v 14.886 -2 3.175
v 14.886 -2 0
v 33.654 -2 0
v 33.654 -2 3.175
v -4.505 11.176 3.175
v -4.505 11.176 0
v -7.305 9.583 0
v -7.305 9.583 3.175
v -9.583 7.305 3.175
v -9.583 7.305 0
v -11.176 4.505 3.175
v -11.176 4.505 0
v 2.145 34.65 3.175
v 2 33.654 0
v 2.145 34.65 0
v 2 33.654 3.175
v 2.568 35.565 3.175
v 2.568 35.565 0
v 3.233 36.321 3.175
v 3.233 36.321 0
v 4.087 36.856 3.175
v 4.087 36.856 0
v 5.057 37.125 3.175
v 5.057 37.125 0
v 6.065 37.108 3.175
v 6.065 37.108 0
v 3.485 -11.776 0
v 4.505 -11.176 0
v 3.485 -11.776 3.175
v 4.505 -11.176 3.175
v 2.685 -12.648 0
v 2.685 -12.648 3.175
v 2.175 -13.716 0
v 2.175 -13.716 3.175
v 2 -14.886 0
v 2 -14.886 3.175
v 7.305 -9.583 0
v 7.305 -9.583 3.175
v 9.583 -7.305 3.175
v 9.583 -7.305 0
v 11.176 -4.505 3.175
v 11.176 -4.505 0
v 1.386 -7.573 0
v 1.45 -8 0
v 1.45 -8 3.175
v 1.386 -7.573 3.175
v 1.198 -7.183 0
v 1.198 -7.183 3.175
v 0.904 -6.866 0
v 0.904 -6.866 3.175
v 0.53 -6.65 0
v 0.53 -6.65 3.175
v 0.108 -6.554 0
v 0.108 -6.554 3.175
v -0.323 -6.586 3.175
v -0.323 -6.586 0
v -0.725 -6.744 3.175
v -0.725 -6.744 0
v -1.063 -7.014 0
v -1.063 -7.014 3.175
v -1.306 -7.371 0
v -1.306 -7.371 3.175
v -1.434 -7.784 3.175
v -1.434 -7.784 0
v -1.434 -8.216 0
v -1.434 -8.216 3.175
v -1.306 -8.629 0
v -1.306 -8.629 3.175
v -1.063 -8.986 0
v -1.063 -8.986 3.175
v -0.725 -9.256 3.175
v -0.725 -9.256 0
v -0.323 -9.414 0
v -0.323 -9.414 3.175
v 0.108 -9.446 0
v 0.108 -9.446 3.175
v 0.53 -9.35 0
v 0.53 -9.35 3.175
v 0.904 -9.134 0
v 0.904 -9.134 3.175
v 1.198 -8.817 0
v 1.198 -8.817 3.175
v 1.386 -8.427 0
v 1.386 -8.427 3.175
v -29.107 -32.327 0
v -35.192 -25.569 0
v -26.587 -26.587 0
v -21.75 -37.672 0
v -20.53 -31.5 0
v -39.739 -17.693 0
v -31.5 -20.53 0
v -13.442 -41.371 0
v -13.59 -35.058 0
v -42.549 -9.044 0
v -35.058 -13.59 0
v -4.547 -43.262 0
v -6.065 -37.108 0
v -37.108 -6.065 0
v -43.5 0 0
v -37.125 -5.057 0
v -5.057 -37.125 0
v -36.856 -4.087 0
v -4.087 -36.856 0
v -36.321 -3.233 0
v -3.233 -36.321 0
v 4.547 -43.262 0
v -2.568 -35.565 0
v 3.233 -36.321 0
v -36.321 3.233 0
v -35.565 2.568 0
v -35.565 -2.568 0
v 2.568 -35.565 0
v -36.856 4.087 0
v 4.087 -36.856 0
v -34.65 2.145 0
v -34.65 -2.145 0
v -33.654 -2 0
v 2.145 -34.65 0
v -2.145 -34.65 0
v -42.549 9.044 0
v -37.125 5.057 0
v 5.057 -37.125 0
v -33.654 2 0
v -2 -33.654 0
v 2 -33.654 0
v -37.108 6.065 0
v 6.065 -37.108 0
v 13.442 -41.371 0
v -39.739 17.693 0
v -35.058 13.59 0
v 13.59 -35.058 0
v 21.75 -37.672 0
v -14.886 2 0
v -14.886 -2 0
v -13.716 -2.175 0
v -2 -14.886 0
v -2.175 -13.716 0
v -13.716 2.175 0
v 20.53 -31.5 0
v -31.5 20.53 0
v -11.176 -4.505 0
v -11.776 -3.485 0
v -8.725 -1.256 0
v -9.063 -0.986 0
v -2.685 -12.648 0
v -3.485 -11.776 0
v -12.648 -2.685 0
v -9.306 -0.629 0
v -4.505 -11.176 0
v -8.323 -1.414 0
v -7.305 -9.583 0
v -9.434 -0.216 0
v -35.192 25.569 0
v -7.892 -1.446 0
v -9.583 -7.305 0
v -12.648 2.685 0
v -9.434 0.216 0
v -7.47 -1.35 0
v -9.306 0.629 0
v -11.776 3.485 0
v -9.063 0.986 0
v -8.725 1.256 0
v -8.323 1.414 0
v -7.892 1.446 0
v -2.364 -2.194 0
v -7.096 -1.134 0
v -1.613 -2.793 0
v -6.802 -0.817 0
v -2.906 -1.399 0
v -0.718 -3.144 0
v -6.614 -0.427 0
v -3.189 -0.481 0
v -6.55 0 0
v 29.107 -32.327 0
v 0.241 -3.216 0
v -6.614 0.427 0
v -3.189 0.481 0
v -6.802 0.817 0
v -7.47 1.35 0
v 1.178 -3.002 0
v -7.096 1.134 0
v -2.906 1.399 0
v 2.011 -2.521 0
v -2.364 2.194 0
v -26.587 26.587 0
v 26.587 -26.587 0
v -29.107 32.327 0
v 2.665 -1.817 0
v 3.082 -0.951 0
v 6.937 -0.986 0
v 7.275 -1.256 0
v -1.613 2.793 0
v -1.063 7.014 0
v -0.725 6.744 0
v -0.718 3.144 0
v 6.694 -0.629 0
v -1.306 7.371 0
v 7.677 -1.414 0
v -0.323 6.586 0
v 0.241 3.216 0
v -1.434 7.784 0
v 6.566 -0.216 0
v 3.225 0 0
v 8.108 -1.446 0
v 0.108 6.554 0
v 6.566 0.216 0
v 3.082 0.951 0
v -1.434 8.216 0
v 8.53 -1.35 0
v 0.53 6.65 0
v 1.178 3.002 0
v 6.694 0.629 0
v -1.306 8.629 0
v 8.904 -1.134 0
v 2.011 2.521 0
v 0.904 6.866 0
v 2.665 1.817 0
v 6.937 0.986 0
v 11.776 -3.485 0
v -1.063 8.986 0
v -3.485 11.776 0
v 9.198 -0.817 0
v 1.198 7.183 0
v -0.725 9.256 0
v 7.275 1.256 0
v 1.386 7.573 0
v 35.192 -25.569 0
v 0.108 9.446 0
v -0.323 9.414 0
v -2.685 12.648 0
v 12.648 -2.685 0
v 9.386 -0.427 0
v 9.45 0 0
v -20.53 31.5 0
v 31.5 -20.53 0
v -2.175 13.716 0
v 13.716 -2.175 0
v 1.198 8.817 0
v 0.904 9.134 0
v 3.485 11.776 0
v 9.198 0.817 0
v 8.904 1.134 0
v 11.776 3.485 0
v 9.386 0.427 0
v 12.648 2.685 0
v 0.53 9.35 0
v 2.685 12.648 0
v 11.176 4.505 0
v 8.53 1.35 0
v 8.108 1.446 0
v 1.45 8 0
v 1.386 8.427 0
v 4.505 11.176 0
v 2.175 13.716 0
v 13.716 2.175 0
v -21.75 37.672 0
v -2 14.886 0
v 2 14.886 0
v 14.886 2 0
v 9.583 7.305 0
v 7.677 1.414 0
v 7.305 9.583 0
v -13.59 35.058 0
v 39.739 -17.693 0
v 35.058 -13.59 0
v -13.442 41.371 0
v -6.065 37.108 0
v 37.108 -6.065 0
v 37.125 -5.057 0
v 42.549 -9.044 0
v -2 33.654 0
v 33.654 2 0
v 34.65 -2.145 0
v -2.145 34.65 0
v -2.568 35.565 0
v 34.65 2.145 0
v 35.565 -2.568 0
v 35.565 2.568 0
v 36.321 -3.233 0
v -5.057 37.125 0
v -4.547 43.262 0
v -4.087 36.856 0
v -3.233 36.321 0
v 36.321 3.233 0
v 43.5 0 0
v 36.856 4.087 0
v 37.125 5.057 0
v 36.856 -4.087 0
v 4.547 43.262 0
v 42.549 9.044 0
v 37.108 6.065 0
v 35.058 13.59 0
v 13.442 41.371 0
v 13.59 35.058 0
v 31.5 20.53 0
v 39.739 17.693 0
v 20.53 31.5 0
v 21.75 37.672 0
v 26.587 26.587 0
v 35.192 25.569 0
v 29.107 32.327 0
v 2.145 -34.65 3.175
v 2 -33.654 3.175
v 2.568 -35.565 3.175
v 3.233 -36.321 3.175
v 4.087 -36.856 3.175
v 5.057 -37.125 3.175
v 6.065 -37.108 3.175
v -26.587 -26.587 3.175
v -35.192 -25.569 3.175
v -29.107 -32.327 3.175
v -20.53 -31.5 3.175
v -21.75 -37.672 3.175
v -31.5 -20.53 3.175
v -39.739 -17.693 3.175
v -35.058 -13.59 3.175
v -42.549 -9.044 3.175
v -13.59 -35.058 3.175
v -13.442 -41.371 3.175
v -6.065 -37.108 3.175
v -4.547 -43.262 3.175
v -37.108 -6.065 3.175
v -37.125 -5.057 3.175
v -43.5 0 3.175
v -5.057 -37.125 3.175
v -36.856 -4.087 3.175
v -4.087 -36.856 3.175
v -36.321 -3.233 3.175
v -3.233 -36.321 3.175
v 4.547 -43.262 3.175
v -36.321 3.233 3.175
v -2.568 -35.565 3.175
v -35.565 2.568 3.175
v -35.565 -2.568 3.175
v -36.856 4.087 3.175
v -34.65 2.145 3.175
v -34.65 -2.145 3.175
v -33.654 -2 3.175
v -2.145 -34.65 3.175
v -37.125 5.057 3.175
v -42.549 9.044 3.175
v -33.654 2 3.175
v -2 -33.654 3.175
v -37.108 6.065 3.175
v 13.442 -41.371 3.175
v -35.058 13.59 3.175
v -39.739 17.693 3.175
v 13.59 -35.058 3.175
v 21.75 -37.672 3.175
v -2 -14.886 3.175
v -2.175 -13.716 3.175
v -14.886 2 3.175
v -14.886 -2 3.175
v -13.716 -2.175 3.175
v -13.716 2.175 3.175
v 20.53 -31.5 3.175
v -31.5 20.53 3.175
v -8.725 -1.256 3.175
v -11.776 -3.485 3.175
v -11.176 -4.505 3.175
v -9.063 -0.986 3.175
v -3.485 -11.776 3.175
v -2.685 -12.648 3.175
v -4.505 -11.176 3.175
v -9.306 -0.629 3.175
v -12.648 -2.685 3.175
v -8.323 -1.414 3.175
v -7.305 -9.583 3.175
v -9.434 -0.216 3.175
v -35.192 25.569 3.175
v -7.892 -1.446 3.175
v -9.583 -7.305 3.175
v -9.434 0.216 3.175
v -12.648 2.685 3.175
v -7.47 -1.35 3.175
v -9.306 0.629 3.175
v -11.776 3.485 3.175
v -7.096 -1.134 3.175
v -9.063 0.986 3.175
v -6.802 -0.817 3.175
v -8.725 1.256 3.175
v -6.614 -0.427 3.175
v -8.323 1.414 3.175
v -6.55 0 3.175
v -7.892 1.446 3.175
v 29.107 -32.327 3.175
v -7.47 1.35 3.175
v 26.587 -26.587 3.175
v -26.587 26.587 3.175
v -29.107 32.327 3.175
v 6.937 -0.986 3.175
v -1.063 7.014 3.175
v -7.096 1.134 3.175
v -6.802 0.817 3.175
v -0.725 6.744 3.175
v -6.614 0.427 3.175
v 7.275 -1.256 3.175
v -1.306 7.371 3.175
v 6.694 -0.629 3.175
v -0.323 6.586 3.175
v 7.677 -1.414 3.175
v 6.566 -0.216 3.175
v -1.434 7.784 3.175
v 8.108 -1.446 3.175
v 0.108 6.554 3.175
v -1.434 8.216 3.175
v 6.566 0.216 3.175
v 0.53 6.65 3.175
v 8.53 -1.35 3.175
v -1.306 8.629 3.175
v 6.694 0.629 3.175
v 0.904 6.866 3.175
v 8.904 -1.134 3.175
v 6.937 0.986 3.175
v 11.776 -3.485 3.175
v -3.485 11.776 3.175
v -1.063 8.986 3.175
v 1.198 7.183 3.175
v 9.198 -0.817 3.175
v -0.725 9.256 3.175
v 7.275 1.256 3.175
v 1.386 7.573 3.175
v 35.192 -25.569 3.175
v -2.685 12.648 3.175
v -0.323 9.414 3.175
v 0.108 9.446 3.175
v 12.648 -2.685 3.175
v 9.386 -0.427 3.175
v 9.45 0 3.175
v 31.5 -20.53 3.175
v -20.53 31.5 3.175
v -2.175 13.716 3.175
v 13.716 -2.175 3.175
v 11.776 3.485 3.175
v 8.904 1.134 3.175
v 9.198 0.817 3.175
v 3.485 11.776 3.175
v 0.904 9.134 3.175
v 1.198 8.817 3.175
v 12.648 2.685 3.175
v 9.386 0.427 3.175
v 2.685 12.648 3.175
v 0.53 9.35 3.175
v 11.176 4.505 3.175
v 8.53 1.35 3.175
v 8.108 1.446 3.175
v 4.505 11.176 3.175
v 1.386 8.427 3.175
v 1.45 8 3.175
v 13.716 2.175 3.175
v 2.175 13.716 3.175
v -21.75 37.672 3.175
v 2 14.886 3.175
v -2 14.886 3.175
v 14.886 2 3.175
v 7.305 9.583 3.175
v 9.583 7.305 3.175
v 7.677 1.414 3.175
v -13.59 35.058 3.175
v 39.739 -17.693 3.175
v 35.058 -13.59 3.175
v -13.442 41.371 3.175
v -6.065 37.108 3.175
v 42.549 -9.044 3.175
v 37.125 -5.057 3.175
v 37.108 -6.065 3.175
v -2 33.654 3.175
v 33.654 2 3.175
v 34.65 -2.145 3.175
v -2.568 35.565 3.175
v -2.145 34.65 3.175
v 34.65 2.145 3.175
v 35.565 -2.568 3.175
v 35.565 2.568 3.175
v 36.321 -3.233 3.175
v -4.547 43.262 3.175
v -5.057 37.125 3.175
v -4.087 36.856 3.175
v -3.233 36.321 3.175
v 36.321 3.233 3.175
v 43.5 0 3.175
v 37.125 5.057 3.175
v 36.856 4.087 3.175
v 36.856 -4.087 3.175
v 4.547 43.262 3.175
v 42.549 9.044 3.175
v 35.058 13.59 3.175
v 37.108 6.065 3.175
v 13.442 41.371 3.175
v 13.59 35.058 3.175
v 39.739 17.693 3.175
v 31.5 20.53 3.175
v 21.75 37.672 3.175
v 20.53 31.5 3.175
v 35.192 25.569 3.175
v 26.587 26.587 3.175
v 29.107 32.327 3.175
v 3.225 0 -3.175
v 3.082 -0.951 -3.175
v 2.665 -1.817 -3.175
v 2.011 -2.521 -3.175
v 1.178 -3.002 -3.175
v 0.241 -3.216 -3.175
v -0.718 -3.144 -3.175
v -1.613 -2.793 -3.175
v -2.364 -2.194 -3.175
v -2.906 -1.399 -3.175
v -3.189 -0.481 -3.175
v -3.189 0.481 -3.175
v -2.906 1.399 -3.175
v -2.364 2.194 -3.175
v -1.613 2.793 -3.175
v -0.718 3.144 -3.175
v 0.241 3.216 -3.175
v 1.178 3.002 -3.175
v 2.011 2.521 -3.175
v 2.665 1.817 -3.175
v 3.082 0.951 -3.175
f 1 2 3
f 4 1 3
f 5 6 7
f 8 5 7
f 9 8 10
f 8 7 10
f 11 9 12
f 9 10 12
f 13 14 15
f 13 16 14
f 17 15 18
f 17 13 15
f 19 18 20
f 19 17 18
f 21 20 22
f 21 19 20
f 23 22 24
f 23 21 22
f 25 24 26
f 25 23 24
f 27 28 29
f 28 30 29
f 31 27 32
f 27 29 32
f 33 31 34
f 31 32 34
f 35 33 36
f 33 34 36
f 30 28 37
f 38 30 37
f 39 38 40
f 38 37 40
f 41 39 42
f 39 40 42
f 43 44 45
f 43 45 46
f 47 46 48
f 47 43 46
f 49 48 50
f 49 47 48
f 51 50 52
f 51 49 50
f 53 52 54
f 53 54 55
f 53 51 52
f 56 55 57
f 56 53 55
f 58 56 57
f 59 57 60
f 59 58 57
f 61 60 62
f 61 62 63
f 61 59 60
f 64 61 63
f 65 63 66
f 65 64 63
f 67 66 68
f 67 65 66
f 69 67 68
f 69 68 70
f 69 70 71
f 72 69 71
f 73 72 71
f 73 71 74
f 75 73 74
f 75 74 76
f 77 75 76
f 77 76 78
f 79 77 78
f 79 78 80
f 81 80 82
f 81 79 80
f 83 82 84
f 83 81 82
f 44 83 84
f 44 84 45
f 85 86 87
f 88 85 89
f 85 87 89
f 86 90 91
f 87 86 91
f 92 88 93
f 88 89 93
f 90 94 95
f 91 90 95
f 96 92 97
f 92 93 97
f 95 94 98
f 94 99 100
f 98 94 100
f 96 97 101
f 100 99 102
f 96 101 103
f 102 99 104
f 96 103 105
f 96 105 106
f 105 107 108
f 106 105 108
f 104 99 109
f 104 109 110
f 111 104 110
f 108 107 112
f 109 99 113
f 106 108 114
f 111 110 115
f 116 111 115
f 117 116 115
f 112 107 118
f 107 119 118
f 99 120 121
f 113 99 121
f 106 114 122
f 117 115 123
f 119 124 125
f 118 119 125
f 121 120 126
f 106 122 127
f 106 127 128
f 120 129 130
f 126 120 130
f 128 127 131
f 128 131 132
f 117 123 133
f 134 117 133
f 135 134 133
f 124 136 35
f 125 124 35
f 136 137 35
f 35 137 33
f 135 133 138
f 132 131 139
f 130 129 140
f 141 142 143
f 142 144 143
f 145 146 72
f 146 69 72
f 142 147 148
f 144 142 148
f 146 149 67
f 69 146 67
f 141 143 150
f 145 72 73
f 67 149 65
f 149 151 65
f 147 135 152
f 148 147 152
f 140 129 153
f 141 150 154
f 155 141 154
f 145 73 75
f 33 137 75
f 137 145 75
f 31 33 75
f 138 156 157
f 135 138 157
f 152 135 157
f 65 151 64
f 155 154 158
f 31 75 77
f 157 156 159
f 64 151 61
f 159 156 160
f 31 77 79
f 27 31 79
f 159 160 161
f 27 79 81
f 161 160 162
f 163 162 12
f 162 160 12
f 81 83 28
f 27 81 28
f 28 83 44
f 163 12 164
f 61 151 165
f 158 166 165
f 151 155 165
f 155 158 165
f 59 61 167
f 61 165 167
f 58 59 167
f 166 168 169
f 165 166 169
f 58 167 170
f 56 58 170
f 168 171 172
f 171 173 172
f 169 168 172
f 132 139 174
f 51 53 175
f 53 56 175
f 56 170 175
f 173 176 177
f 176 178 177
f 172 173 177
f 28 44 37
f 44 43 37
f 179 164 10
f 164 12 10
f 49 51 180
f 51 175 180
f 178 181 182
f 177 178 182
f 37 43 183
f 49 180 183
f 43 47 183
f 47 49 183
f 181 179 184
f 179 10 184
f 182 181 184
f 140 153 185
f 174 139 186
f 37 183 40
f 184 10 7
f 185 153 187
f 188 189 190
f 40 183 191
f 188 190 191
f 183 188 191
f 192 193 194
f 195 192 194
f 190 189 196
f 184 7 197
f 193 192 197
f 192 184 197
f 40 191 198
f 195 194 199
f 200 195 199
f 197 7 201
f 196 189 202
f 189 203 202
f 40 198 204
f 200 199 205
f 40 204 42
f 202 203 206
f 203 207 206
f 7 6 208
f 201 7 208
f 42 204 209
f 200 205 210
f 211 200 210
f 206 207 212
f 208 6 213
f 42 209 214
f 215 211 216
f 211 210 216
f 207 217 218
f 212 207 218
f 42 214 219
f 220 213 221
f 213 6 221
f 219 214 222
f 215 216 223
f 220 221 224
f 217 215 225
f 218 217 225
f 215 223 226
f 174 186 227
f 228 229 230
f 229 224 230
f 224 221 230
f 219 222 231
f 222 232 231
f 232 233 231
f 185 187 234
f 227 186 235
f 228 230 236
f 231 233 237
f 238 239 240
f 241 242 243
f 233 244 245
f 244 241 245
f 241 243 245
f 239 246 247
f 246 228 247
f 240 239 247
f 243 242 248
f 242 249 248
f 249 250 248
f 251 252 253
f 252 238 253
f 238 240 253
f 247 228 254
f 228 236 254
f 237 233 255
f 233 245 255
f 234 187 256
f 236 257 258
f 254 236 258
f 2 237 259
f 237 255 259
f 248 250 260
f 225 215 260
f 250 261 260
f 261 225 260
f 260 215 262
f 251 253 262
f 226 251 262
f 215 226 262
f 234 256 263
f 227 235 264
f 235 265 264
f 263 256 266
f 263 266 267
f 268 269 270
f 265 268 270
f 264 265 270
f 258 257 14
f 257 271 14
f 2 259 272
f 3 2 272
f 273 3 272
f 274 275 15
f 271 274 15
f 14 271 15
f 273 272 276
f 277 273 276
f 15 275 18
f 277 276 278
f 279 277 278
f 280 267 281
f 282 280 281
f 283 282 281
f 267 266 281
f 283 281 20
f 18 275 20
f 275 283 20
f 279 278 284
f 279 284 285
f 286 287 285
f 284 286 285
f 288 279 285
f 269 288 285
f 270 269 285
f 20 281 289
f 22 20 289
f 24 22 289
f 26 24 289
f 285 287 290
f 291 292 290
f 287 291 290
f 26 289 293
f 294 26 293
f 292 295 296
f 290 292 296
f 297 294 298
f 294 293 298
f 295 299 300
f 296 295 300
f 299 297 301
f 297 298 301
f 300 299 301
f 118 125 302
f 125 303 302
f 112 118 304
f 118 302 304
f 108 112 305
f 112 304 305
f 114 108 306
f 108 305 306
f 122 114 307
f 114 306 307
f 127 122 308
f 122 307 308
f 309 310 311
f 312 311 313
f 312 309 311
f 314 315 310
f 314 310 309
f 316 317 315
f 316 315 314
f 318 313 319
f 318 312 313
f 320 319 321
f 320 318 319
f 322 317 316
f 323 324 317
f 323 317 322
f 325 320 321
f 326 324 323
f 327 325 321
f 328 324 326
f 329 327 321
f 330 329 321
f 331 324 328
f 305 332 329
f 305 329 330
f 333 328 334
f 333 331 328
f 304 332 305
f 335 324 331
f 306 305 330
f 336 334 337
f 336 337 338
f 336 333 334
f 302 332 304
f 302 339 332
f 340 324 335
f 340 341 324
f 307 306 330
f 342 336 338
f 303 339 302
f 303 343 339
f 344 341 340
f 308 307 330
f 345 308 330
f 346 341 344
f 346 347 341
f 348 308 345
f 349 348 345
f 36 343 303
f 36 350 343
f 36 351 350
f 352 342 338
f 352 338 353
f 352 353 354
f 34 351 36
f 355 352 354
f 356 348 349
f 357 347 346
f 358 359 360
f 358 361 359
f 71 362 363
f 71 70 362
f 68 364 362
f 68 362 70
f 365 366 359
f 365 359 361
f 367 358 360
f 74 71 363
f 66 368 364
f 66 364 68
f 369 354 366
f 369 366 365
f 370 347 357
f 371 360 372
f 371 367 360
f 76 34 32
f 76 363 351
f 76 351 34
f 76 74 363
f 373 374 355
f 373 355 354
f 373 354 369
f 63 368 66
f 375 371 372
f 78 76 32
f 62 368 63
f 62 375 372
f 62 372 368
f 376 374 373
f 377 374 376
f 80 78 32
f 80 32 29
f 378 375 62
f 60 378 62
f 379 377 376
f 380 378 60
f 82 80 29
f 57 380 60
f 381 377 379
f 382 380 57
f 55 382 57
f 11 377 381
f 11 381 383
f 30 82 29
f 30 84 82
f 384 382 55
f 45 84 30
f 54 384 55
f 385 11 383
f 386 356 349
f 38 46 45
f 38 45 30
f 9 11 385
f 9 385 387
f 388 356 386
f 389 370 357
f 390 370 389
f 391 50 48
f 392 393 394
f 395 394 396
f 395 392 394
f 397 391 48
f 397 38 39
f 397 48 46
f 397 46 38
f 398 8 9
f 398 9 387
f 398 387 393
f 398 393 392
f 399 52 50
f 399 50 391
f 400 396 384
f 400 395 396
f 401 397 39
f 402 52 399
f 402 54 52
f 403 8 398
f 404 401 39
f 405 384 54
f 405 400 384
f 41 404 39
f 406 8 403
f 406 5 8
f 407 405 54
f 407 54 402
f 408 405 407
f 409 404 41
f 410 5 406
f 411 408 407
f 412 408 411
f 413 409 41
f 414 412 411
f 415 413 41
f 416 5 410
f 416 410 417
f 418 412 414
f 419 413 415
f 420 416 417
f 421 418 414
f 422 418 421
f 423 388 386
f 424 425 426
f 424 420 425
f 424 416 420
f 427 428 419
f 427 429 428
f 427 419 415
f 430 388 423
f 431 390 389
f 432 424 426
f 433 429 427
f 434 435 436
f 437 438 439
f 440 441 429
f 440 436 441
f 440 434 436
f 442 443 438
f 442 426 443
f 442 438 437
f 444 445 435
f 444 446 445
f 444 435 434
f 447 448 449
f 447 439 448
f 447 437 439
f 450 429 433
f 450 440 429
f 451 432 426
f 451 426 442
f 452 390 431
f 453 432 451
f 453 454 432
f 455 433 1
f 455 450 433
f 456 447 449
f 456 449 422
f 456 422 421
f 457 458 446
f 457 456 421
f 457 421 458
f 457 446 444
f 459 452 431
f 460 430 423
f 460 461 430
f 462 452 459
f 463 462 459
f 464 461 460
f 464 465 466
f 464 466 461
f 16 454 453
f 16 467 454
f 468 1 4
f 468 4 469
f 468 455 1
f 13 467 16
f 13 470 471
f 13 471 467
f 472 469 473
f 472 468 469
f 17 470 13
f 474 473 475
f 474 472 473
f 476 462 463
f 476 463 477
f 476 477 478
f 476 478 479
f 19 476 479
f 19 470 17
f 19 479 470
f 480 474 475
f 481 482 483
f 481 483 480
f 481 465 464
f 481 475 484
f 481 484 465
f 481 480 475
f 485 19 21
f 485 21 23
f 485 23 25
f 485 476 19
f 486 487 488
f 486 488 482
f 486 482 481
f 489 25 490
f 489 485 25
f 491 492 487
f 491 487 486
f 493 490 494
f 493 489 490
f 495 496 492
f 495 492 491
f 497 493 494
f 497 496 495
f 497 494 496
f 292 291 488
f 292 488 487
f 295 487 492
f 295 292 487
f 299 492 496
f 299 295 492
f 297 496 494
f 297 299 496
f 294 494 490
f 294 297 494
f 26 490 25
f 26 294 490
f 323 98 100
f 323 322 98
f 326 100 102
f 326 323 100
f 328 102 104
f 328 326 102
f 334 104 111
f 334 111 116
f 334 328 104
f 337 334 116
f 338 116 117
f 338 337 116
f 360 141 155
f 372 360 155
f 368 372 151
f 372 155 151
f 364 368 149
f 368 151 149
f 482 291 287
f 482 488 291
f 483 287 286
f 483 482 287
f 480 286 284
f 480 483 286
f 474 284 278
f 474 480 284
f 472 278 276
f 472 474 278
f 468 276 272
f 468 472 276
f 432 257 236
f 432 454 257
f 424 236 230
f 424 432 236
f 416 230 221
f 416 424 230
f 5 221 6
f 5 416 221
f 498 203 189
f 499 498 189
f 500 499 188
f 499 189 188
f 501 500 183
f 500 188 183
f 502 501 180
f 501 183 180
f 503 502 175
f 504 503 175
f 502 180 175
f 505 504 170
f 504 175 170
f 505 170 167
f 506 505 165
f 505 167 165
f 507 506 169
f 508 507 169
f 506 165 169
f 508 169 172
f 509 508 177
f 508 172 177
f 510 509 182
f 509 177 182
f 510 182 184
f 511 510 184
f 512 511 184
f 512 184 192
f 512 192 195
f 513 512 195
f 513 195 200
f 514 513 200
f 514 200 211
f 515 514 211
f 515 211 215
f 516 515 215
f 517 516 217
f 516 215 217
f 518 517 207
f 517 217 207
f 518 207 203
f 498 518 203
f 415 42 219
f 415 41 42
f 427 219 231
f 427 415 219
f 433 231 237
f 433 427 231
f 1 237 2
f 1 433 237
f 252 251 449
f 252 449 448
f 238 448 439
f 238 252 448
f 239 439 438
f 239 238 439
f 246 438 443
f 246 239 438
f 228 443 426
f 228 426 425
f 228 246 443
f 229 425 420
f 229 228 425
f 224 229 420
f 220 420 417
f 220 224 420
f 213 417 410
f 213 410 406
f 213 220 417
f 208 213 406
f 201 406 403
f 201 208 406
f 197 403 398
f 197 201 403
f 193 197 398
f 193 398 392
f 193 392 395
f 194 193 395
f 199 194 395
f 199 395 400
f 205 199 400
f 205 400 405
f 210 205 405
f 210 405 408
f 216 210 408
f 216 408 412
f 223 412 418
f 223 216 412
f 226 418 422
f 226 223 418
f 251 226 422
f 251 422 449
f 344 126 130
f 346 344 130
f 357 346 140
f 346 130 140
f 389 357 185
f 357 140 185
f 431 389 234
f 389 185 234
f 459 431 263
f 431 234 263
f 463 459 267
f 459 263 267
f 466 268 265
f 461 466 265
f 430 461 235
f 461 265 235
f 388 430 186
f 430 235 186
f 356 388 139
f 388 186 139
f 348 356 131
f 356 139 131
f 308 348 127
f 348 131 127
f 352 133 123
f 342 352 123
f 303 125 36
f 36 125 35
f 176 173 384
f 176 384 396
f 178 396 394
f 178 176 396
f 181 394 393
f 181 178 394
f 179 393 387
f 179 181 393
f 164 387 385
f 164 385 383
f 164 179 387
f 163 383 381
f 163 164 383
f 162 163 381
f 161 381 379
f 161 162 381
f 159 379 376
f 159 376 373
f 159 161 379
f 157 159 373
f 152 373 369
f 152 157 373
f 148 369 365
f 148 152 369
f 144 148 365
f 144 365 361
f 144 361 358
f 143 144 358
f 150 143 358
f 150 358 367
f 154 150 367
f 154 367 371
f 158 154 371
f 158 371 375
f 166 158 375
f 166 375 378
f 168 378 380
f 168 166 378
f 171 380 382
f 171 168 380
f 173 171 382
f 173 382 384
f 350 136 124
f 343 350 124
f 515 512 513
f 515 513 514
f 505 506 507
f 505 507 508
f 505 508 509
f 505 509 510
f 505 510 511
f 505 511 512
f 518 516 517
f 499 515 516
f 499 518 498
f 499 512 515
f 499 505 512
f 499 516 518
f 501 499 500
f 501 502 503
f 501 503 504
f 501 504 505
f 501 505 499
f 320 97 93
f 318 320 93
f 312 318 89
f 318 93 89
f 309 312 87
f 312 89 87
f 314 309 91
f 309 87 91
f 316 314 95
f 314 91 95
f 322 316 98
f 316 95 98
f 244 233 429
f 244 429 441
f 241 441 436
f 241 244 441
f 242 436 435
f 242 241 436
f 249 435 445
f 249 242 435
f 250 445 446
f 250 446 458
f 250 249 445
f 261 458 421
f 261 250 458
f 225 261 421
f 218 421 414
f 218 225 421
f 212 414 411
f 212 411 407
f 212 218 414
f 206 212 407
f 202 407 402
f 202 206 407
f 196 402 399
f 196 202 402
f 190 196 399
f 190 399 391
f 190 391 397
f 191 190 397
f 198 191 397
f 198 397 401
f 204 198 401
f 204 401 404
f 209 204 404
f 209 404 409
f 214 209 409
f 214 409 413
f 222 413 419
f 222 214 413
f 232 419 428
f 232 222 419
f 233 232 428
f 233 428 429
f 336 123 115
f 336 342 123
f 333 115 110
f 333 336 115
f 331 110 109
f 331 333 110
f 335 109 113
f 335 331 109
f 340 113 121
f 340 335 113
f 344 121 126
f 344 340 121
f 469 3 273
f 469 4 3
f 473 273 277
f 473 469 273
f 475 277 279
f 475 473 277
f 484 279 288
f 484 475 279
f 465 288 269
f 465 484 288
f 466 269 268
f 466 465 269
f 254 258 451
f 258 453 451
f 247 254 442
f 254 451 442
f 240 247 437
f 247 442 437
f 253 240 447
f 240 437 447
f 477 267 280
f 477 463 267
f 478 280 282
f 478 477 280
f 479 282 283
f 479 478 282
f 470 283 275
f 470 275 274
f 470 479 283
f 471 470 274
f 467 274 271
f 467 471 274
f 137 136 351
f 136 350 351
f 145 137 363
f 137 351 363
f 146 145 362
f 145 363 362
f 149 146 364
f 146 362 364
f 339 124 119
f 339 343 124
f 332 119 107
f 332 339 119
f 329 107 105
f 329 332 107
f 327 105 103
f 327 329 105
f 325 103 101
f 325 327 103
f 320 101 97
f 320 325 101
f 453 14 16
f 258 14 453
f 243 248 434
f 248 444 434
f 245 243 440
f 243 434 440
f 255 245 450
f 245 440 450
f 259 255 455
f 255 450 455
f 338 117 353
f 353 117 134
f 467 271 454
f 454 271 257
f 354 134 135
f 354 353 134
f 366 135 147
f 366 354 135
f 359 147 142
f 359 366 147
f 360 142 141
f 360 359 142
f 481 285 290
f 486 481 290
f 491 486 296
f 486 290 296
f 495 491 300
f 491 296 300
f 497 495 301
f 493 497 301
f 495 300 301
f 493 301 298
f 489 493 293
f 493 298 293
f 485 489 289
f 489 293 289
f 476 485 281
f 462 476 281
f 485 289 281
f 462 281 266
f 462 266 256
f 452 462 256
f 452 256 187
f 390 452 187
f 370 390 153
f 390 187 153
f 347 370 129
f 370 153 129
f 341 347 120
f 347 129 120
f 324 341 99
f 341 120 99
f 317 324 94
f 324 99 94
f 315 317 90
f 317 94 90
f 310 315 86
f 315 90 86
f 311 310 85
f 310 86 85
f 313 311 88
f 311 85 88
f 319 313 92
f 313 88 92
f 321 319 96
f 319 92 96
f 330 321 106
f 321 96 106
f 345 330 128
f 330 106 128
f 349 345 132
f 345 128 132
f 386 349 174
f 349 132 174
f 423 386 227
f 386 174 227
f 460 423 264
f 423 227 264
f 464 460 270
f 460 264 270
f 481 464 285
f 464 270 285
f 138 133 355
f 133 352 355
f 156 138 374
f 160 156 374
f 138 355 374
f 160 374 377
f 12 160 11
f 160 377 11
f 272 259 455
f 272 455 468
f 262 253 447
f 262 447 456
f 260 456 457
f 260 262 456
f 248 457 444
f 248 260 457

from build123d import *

# Parameters (mm, degrees)
SKETCH1_R           = 43.5
SKETCH1_R_2         = 1.45
BOSS_EXTRUDE1_DEPTH = 3.175
FILLET1_R           = 4
FILLET2_R           = 3.5
SKETCH3_R           = 3.225
BOSS_EXTRUDE2_DEPTH = 3.175


with BuildPart() as part:
    # Sketch1 → Boss-Extrude1 (new body)
    with BuildSketch(Plane.XY):
        Circle(SKETCH1_R)
        with Locations((0, 8)):
            Circle(SKETCH1_R_2, mode=Mode.SUBTRACT)
        with Locations((0, -8)):
            Circle(SKETCH1_R_2, mode=Mode.SUBTRACT)
        with Locations((8, 0)):
            Circle(SKETCH1_R_2, mode=Mode.SUBTRACT)
        with Locations((-8, 0)):
            Circle(SKETCH1_R_2, mode=Mode.SUBTRACT)
        with BuildLine():
            Line((-37.546770833, -2), (-11.882865816, -2))
            ThreePointArc((-11.882865816, -2), (-8.520636713, -8.520636713), (-2, -11.882865816))
            Line((-2, -11.882865816), (-2, -37.546770833))
            ThreePointArc((-2, -37.546770833), (-26.587214973, -26.587214973), (-37.546770833, -2))
        make_face(mode=Mode.SUBTRACT)
        with BuildLine():
            Line((-2, 37.546770833), (-2, 11.882865816))
            ThreePointArc((-2, 11.882865816), (-8.520636713, 8.520636713), (-11.882865816, 2))
            Line((-11.882865816, 2), (-37.546770833, 2))
            ThreePointArc((-37.546770833, 2), (-26.587214973, 26.587214973), (-2, 37.546770833))
        make_face(mode=Mode.SUBTRACT)
        with BuildLine():
            Line((2, 37.546770833), (2, 11.882865816))
            ThreePointArc((2, 11.882865816), (8.520636713, 8.520636713), (11.882865816, 2))
            Line((11.882865816, 2), (37.546770833, 2))
            ThreePointArc((37.546770833, 2), (26.587214973, 26.587214973), (2, 37.546770833))
        make_face(mode=Mode.SUBTRACT)
        with BuildLine():
            Line((11.882865816, -2), (37.546770833, -2))
            ThreePointArc((37.546770833, -2), (26.587214973, -26.587214973), (2, -37.546770833))
            Line((2, -37.546770833), (2, -11.882865816))
            ThreePointArc((2, -11.882865816), (8.520636713, -8.520636713), (11.882865816, -2))
        make_face(mode=Mode.SUBTRACT)
    extrude(amount=BOSS_EXTRUDE1_DEPTH)

    # Fillet1
    fillet1_edges = [part.edges().sort_by_distance(p)[0] for p in [
        (-11.882865816, 2, 1.5875),
        (-2, 11.882865816, 1.5875),
        (-2, -11.882865816, 1.5875),
        (-11.882865816, -2, 1.5875),
        (11.882865816, -2, 1.5875),
        (2, -11.882865816, 1.5875),
        (2, 11.882865816, 1.5875),
        (11.882865816, 2, 1.5875),
    ]]
    fillet(fillet1_edges, radius=FILLET1_R)

    # Fillet2
    fillet2_edges = [part.edges().sort_by_distance(p)[0] for p in [
        (-2, 37.546770833, 1.5875),
        (-37.546770833, 2, 1.5875),
        (-37.546770833, -2, 1.5875),
        (-2, -37.546770833, 1.5875),
        (2, -37.546770833, 1.5875),
        (37.546770833, -2, 1.5875),
        (37.546770833, 2, 1.5875),
        (2, 37.546770833, 1.5875),
    ]]
    fillet(fillet2_edges, radius=FILLET2_R)

    # Sketch3 → Boss-Extrude2 (add)
    with BuildSketch(Plane(origin=(0, 0, 0), x_dir=(-1, 0, 0), z_dir=(0, 0, -1))):
        with Locations(Location((0, 0, 0), (0, 0, 180))):
            Circle(SKETCH3_R)
    extrude(amount=BOSS_EXTRUDE2_DEPTH)


solid = part.part
